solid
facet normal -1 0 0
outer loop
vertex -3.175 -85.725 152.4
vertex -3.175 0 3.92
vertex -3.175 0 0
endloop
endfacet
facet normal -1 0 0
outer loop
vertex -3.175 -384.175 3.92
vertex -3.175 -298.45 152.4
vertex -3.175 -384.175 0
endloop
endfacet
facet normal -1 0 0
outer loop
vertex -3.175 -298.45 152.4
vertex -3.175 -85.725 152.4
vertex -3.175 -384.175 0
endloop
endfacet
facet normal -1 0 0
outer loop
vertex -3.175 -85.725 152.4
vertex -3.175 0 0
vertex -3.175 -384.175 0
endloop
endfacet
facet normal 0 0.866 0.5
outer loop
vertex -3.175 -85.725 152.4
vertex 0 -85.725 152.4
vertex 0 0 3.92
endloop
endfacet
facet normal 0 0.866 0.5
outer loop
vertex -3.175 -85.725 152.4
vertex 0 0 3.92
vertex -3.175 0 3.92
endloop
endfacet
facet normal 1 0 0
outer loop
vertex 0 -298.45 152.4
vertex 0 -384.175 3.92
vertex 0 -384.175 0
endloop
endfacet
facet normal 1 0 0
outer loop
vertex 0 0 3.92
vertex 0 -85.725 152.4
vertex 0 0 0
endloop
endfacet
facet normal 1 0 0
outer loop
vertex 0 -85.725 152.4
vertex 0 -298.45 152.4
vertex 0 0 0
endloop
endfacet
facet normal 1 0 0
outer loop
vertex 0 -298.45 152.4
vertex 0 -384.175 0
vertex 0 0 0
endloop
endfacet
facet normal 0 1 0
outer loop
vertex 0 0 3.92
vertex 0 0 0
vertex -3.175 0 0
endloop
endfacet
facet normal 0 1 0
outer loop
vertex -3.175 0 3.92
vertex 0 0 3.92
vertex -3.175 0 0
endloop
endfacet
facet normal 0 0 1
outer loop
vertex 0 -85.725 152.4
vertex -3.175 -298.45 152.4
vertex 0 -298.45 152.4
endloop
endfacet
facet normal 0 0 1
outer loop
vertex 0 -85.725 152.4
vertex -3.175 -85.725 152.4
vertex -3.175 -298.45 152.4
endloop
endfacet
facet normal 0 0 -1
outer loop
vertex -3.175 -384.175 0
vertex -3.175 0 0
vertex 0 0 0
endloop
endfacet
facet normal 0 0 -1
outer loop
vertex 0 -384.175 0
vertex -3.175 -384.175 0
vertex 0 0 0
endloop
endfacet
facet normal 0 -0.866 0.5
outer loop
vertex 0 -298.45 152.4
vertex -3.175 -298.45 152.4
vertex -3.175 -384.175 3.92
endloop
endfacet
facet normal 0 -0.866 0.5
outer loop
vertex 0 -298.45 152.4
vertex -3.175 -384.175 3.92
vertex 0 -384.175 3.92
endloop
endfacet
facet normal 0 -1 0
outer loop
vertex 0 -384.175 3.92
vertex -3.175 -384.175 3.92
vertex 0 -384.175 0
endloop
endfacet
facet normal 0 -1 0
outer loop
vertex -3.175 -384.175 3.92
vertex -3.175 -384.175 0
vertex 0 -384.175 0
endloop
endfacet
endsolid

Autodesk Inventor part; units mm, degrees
ref_plane "YZ Plane" through (0, 0, 0) normal (1, 0, 0) x (0, 1, 0)
ref_plane "XZ Plane" through (0, 0, 0) normal (0, 1, 0) x (-1, 0, 0)
ref_plane "XY Plane" through (0, 0, 0) normal (0, 0, 1) x (1, 0, 0)
sketch "Sketch1" plane through (0, 0, 0) normal (0, 0, 1) x (1, 0, 0)
  line L0 (0, 0) -> (-3.175, 0)
  line L1 (-3.175, 0) -> (-3.175, -384.175)
  line L2 (-3.175, -384.175) -> (0, -384.175)
  line L3 (0, -384.175) -> (0, 0)
  dimension "d0" = 384.175
  dimension "d1" = 3.175
extrude "Extrusion1" add sketch "Sketch1" along normal blind 152.4
chamfer "Chamfer1" distance 85.725 angle 60 1 edges at (-1.5875, -384.175, 152.4) measured on face at (-1.0583, -256.1167, 152.4)
chamfer "Chamfer2" distance 85.725 angle 60 1 edges at (-1.5875, 0, 152.4) measured on face at (-1.0583, -198.9667, 152.4)
